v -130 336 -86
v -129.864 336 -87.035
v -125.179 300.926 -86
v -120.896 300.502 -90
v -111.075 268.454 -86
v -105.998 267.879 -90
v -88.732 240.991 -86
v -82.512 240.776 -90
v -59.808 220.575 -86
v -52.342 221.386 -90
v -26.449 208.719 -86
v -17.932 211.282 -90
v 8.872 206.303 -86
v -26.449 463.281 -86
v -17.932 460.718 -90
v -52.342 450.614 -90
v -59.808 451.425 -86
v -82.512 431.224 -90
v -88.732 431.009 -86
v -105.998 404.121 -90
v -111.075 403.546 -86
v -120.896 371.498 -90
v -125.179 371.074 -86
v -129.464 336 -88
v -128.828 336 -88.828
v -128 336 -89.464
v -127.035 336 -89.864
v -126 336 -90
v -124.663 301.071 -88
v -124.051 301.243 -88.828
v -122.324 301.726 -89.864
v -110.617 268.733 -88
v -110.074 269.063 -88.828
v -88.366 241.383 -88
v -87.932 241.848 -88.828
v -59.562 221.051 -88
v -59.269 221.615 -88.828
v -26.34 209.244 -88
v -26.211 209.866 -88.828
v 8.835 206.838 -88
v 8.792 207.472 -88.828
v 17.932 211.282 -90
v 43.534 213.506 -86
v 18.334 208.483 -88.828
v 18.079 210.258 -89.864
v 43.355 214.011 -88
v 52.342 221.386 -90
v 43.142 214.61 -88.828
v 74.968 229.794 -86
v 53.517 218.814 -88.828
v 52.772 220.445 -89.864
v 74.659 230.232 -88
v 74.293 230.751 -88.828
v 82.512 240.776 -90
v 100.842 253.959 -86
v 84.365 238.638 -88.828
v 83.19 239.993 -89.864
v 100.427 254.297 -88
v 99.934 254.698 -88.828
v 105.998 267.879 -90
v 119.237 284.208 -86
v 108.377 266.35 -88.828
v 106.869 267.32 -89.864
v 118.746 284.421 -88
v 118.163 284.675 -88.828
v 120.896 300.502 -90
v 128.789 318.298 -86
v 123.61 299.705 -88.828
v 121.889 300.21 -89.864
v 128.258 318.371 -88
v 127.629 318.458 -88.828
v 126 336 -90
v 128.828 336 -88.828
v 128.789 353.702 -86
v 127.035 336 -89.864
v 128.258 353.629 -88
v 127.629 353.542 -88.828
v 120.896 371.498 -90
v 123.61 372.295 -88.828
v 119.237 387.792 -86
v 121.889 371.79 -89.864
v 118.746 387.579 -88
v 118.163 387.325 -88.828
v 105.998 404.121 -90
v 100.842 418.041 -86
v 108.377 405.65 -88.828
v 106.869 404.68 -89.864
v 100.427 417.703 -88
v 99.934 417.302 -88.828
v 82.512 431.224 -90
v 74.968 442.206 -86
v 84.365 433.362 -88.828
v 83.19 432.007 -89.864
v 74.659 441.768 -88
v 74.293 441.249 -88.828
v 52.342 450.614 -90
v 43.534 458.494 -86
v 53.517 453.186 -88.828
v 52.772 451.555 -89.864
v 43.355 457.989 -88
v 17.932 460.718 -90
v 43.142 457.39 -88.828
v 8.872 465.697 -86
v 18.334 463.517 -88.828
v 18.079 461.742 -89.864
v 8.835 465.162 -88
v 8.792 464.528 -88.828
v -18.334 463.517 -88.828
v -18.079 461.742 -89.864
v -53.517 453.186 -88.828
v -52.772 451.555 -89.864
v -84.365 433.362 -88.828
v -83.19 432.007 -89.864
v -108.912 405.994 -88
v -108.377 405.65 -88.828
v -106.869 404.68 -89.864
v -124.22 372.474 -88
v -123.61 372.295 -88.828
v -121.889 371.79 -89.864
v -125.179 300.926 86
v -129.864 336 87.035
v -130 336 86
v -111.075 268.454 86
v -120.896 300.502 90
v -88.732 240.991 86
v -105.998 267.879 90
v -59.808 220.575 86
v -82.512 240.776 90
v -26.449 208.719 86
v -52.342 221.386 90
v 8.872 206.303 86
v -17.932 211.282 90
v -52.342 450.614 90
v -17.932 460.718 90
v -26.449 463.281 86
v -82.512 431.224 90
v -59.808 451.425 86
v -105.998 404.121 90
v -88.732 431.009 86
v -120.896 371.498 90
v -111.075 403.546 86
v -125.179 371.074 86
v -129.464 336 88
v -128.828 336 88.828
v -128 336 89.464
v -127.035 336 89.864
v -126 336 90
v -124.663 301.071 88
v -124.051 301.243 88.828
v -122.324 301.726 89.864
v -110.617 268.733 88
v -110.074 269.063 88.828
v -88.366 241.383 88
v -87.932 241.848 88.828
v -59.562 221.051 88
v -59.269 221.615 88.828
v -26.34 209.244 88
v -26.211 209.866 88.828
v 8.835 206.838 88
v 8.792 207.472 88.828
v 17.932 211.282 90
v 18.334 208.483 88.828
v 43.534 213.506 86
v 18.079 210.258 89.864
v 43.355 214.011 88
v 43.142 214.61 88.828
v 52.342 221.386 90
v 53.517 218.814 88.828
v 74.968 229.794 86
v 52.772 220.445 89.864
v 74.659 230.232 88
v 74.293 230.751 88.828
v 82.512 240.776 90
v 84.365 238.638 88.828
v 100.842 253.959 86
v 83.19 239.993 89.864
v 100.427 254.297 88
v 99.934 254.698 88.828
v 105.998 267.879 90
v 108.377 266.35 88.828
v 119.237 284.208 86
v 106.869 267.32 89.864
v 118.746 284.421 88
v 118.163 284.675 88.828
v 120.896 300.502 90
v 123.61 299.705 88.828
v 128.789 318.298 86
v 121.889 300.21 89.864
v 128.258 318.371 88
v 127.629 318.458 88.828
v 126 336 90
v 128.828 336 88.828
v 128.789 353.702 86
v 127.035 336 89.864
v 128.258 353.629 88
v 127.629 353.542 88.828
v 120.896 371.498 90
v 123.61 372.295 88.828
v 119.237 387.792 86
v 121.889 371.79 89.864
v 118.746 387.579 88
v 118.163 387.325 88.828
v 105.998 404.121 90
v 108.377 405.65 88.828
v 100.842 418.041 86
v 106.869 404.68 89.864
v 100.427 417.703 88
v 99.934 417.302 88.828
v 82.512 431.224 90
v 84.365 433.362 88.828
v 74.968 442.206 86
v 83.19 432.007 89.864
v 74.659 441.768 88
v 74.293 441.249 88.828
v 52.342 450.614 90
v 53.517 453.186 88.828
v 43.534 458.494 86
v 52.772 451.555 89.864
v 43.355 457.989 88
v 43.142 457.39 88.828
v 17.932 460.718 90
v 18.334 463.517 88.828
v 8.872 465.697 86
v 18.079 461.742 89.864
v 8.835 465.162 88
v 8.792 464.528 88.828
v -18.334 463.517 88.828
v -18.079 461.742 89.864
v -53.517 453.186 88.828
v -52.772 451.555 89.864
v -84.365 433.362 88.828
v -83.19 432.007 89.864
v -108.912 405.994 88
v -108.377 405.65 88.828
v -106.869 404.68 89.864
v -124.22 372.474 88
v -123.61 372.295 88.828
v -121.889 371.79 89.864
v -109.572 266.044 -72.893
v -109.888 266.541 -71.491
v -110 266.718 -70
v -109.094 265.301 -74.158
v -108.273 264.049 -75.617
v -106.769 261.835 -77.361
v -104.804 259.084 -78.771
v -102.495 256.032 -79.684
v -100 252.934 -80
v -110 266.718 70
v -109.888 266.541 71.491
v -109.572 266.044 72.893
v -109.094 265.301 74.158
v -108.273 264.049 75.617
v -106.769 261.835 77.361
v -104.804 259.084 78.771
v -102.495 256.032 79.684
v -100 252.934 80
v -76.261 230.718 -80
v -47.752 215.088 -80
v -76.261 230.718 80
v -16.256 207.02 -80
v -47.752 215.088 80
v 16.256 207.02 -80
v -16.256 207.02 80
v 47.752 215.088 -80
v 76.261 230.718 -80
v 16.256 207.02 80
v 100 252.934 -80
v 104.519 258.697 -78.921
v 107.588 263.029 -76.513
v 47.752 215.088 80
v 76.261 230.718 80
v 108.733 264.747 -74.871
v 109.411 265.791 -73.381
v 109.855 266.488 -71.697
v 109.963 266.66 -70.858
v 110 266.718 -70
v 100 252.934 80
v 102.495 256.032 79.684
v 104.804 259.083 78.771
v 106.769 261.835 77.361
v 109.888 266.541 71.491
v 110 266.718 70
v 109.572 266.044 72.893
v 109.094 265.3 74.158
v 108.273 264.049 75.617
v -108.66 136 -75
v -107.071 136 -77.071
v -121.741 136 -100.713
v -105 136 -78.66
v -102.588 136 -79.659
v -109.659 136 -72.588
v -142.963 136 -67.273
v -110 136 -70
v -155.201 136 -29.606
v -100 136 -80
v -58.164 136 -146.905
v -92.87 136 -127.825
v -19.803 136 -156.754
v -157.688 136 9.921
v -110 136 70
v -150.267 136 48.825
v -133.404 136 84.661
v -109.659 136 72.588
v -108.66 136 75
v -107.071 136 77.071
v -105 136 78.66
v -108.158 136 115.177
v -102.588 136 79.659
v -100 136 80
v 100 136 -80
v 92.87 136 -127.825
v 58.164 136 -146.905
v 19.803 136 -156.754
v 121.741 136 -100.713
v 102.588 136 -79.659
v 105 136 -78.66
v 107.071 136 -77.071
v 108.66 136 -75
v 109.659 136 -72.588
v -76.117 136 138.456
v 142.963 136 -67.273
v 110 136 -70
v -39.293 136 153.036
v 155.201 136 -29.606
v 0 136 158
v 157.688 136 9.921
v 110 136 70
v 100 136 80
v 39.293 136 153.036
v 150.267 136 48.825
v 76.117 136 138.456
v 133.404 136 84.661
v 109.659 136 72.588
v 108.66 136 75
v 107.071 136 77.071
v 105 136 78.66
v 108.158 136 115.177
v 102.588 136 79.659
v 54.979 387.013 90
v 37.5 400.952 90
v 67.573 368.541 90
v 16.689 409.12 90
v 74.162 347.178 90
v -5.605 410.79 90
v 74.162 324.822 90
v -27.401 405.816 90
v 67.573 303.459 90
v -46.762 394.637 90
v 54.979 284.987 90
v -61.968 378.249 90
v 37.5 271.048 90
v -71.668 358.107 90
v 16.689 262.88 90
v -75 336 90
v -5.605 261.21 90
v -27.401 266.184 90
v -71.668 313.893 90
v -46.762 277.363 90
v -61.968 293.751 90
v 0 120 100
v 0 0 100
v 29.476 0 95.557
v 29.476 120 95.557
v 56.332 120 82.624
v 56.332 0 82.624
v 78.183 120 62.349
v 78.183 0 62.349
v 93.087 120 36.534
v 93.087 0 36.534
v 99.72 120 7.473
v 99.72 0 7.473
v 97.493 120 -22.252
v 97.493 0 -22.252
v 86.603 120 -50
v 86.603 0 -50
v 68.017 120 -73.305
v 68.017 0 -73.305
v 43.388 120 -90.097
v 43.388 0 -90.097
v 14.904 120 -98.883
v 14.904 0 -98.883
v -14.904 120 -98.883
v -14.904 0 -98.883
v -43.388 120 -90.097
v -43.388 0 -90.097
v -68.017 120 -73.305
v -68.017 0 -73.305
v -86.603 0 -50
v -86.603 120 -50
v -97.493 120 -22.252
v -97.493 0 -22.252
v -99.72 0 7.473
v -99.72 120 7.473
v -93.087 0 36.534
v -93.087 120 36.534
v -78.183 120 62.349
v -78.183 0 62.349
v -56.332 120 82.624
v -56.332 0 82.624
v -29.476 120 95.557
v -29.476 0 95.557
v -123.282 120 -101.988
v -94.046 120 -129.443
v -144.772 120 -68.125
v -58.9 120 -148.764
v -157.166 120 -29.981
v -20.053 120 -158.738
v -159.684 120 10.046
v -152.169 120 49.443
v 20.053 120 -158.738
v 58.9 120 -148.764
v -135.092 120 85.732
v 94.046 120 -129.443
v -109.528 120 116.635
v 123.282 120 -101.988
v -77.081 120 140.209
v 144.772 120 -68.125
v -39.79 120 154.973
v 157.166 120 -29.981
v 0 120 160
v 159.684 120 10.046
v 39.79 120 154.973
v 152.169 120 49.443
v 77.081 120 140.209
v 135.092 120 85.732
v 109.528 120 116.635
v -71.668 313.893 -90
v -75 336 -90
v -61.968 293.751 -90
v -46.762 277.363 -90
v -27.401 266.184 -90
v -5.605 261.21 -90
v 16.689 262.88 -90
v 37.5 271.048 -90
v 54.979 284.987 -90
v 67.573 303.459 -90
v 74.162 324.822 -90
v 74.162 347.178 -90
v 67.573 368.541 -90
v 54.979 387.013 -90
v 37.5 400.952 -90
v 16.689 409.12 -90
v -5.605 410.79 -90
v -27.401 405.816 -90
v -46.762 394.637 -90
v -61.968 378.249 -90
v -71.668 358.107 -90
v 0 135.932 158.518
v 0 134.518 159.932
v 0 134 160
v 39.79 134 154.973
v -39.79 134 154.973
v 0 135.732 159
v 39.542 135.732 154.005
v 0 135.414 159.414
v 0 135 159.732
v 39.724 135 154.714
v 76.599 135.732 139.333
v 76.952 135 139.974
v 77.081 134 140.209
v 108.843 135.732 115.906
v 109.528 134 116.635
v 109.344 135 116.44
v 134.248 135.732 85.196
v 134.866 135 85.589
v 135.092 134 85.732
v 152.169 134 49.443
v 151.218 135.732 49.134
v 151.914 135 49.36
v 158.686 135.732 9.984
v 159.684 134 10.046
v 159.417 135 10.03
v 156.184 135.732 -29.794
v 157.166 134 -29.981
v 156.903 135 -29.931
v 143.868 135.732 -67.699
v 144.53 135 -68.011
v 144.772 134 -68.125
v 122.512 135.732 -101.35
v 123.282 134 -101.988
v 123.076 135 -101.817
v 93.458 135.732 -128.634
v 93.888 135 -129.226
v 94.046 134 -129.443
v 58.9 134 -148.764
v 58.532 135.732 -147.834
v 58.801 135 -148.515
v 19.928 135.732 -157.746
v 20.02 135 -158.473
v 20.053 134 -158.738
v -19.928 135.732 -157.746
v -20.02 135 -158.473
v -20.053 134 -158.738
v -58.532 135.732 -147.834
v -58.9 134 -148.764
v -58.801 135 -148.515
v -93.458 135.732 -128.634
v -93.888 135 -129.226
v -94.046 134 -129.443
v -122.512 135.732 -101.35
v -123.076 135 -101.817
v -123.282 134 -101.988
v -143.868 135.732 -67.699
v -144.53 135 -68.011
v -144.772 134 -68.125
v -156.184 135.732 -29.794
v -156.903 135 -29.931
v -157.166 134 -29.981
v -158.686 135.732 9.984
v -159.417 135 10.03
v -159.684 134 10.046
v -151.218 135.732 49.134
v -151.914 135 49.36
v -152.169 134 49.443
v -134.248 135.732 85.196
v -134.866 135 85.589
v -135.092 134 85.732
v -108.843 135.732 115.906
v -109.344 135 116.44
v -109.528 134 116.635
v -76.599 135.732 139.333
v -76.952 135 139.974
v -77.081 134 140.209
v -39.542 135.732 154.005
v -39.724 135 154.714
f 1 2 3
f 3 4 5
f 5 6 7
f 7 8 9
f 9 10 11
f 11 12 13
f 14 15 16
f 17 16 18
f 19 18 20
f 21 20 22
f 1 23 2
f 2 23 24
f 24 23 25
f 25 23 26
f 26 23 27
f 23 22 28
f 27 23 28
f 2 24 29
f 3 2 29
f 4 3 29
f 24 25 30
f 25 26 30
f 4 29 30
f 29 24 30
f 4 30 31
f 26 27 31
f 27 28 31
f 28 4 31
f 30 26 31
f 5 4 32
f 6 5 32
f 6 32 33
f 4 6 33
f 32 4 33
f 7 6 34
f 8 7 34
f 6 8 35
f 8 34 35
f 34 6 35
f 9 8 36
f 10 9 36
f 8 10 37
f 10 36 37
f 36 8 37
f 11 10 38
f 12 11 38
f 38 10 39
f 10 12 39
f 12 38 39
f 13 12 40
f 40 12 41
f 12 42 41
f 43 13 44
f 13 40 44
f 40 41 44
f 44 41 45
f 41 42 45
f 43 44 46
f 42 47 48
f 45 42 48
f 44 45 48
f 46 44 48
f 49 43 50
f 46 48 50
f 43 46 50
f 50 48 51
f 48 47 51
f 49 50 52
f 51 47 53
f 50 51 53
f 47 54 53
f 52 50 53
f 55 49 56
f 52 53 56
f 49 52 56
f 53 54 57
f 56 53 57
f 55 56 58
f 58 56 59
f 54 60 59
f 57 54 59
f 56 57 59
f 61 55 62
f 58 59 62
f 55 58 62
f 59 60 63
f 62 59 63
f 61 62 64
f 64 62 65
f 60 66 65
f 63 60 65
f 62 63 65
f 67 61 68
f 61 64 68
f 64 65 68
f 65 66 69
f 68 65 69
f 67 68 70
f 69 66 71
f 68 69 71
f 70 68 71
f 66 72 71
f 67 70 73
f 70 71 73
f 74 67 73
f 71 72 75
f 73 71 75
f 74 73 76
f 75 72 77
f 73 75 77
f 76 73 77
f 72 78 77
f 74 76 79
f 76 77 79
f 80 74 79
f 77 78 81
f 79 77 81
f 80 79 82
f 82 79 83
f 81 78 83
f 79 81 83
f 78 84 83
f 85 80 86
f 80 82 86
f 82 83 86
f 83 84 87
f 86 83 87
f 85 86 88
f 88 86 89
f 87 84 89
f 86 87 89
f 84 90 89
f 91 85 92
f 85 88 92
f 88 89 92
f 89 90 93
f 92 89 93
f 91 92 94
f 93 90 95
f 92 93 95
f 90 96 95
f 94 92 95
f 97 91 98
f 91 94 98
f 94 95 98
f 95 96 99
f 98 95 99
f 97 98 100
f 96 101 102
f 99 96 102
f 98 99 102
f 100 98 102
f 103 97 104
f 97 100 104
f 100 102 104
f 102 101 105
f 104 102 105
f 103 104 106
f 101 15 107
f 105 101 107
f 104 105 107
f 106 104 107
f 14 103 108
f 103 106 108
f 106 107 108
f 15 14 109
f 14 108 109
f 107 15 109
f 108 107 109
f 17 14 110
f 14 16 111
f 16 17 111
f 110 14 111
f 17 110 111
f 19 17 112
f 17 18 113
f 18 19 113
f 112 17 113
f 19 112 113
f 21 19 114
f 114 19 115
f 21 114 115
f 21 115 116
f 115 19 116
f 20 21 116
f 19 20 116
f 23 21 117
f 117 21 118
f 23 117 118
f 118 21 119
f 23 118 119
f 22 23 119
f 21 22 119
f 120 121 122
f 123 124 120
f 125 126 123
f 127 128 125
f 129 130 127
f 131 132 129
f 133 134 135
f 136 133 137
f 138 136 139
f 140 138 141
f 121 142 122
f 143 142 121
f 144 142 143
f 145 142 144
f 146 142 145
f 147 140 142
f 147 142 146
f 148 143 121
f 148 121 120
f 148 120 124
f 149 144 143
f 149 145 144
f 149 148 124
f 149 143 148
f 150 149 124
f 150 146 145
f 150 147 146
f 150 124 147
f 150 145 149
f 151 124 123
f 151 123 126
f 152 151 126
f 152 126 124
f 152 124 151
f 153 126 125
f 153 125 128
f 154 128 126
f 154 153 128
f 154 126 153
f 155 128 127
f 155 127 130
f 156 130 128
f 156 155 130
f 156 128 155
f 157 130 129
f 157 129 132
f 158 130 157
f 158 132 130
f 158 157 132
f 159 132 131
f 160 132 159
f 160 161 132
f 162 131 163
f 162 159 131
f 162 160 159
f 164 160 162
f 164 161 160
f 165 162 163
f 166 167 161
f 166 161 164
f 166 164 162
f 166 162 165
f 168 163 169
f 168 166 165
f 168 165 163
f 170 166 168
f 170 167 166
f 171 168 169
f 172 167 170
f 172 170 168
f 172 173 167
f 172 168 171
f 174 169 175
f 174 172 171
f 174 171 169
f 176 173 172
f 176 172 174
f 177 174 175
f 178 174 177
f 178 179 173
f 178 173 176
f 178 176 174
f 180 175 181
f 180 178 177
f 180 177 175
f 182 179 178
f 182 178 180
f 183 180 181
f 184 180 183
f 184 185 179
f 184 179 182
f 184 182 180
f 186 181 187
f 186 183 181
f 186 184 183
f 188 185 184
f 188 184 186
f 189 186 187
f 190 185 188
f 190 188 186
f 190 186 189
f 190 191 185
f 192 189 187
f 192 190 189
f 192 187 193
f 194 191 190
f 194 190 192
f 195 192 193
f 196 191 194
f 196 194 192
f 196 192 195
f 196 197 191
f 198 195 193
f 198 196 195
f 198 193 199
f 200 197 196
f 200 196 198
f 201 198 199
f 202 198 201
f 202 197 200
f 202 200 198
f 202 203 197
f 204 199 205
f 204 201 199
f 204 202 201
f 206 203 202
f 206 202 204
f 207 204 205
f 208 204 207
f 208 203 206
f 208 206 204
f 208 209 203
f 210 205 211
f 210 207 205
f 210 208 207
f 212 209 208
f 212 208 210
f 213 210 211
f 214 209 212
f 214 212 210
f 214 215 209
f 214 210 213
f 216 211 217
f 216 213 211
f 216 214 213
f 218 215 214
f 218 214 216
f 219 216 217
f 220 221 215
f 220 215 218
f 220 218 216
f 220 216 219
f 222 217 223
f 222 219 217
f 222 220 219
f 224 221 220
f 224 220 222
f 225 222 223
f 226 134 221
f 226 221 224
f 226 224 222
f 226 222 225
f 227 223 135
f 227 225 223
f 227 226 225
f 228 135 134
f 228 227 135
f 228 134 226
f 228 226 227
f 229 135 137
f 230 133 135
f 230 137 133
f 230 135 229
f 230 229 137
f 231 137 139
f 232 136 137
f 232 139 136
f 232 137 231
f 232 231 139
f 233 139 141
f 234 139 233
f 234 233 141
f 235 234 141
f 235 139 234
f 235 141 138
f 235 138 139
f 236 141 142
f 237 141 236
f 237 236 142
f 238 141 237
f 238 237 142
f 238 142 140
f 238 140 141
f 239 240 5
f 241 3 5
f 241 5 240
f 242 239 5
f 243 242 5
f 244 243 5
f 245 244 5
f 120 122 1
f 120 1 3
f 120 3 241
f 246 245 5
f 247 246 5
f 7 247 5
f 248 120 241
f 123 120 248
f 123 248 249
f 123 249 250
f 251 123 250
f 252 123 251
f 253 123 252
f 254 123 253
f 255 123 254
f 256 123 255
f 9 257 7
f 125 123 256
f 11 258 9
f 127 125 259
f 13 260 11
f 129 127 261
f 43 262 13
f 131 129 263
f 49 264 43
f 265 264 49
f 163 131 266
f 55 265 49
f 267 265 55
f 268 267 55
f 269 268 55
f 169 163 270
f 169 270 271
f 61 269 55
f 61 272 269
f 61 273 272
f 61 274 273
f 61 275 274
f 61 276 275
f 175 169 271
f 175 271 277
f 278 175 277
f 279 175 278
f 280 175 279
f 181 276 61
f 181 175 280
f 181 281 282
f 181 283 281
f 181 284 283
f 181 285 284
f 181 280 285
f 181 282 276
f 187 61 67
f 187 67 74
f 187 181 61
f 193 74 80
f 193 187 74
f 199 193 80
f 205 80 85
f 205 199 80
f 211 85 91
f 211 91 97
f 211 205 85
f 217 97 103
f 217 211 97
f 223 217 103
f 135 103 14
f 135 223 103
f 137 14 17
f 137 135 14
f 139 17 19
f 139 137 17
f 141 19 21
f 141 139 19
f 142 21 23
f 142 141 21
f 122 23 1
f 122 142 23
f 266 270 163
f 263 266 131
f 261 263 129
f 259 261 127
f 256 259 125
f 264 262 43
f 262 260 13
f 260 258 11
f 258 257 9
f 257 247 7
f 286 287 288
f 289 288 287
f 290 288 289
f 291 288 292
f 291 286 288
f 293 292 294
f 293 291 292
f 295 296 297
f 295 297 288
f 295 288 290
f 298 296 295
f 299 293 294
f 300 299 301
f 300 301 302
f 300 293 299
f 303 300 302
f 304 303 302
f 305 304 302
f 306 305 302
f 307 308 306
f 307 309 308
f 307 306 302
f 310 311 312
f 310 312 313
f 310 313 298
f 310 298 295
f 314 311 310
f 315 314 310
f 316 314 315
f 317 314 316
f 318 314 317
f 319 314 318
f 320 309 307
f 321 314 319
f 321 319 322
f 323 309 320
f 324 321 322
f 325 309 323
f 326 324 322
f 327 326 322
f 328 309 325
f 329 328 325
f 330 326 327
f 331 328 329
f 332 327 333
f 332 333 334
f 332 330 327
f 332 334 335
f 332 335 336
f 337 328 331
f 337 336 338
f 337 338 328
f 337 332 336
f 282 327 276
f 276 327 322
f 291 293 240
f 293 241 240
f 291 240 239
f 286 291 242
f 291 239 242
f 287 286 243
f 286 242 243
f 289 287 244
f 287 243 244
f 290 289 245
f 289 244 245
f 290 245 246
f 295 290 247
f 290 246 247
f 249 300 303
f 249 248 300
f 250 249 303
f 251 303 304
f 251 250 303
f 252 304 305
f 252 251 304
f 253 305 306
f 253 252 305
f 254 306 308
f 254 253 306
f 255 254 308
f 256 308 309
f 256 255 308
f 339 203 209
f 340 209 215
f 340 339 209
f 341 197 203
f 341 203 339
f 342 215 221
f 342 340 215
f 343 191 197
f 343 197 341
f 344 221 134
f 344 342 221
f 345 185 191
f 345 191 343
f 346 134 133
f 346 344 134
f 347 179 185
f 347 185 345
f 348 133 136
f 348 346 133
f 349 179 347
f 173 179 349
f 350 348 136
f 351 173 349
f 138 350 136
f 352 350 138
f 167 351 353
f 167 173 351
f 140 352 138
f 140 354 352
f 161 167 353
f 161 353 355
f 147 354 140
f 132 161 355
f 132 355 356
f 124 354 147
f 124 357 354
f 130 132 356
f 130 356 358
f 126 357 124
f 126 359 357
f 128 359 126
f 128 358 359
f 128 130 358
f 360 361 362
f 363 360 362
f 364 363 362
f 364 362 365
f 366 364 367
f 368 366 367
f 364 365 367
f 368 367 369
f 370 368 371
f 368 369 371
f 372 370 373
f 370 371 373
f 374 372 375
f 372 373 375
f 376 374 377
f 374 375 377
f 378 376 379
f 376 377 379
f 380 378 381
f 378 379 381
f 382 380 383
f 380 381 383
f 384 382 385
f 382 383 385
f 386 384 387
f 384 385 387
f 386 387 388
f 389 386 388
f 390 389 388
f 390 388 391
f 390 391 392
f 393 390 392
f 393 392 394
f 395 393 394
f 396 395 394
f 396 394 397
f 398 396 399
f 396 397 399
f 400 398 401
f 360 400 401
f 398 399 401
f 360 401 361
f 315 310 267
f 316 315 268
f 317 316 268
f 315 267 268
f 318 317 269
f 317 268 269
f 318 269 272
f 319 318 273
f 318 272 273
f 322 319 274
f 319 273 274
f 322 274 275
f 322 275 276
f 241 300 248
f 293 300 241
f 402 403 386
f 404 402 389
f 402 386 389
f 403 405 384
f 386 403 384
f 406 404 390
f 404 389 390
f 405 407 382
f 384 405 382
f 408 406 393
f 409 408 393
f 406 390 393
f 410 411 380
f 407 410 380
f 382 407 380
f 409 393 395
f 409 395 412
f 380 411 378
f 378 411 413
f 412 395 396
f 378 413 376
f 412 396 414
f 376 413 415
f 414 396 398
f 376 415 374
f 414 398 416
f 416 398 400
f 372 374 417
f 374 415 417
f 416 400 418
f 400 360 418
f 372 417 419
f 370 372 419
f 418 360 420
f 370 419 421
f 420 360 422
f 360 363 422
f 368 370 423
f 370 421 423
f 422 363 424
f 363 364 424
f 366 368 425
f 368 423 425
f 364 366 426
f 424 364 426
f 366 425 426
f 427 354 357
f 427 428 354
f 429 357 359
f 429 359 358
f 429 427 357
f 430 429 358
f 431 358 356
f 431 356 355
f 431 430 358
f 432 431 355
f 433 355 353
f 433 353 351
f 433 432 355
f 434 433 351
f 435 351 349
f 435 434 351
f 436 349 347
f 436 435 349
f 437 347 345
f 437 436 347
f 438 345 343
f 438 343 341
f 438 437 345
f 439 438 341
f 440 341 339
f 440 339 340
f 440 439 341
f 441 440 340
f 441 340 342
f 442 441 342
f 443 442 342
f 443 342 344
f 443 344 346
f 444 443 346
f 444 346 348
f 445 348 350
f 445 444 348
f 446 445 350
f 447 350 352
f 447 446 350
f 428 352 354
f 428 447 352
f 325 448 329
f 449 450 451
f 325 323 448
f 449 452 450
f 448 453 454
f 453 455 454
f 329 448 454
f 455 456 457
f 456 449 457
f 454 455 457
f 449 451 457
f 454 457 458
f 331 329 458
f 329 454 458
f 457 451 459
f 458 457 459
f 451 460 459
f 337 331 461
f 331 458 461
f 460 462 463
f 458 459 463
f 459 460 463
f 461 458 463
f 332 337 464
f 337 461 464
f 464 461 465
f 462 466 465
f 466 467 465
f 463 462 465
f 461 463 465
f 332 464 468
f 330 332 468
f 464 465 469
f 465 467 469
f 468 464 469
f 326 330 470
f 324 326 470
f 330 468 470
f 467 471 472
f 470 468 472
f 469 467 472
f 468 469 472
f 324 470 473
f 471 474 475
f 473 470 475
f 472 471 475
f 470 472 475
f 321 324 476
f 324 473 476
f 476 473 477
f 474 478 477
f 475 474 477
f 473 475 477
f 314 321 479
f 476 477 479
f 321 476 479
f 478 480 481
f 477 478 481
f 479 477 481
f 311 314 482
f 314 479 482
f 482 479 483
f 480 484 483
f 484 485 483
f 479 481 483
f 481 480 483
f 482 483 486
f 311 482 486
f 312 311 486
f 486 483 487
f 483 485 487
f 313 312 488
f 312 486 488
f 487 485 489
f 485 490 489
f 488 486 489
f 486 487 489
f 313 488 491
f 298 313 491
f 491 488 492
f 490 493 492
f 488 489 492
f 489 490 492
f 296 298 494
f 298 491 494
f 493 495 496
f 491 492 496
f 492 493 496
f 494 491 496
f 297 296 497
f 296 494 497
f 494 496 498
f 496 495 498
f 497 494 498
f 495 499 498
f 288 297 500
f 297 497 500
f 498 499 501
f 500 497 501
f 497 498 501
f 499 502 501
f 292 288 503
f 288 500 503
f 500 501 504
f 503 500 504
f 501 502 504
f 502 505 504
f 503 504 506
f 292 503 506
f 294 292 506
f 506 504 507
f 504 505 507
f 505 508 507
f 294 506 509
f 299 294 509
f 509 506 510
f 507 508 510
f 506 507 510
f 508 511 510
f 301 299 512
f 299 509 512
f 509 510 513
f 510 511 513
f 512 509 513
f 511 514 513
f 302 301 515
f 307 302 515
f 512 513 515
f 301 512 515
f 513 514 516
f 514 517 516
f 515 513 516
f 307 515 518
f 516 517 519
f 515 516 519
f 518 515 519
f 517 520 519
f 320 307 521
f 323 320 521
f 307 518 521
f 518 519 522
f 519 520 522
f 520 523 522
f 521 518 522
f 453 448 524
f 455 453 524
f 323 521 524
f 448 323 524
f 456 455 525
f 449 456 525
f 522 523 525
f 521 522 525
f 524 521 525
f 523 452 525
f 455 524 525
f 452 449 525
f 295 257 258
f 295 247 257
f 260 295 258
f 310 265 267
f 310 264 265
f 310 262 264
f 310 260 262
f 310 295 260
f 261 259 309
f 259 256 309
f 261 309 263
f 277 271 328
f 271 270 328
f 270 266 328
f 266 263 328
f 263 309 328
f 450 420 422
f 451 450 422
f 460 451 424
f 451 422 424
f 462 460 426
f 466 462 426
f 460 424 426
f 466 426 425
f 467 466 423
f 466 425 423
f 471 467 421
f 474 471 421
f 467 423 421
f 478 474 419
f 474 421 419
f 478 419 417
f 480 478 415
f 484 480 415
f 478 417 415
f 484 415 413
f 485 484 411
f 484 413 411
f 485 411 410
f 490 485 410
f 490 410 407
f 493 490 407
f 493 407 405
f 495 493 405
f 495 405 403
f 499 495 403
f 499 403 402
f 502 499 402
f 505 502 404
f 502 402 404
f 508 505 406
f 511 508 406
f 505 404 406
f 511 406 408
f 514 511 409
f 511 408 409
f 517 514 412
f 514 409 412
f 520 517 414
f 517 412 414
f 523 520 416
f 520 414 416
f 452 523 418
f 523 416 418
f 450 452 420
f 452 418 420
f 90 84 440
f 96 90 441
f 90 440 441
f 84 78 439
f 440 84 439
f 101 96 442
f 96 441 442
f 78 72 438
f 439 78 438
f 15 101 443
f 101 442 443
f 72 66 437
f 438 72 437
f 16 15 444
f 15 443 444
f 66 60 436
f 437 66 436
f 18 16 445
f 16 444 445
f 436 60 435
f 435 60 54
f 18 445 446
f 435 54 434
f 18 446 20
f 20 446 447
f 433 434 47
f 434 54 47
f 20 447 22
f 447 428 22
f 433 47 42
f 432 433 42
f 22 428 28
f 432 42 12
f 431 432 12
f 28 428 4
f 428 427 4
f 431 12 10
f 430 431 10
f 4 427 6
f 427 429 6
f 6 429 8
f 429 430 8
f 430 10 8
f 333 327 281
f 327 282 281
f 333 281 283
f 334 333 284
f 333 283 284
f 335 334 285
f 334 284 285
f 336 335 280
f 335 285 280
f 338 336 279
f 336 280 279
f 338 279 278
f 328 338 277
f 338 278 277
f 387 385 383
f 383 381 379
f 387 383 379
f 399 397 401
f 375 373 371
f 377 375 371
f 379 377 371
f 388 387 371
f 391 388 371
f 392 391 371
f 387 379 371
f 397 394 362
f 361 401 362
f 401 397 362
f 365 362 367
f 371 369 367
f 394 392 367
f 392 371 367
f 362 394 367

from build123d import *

# Parameters (mm, degrees)
SKETCH1_R                = 100
BOSS_EXTRUDE1_DEPTH      = 120
SKETCH2_R                = 160
BOSS_EXTRUDE2_DEPTH      = 16
SKETCH3_R                = 130
SKETCH3_R_2              = 75
BOSS_EXTRUDE3_DEPTH      = 90
BOSS_EXTRUDE4_REACH      = 402.125
BOSS_EXTRUDE4_END_RADIUS = 130
SKETCH4_W                = 220
SKETCH4_H                = 160
FILLET1_R                = 2
FILLET2_R                = 4
FILLET3_R                = 10


with BuildPart() as part:
    # Sketch1 → Boss-Extrude1 (new body)
    with BuildSketch(Plane(origin=(0, 0, 0), x_dir=(1, 0, 0), z_dir=(0, 1, 0))):
        with Locations(Location((0, 0, 0), (0, 0, 270))):
            Circle(SKETCH1_R)
    extrude(amount=BOSS_EXTRUDE1_DEPTH)

    # Sketch2 → Boss-Extrude2 (add)
    with BuildSketch(Plane(origin=(0, 120, 0), x_dir=(1, 0, 0), z_dir=(0, 1, 0))):
        with Locations(Location((0, 0, 0), (0, 0, 270))):
            Circle(SKETCH2_R)
    extrude(amount=BOSS_EXTRUDE2_DEPTH)



with BuildPart() as body_2:
    # Sketch3 → Boss-Extrude3 (new, symmetric)
    with BuildSketch(Plane.XY):
        with Locations(Location((0, 336, 0), (0, 0, 180))):
            Circle(SKETCH3_R)
        with Locations(Location((0, 336, 0), (0, 0, 180))):
            Circle(SKETCH3_R_2, mode=Mode.SUBTRACT)
    extrude(amount=BOSS_EXTRUDE3_DEPTH, both=True)


with BuildPart() as part_1:
    add(part.part)

    add(body_2.part)  # Boss-Extrude4 merges body 2
    # Boss-Extrude4: up to this cylinder (the profile starts outside it)
    boss_extrude4_end = Plane(origin=(0, 336, 0), z_dir=(0, 0, -1)) * Cylinder(BOSS_EXTRUDE4_END_RADIUS, 1065.25, mode=Mode.PRIVATE)
    # Sketch4 → Boss-Extrude4 (add, up to the surface)
    with BuildSketch(Plane(origin=(0, 136, 0), x_dir=(1, 0, 0), z_dir=(0, 1, 0)), mode=Mode.PRIVATE) as boss_extrude4_sk1:
        Rectangle(SKETCH4_W, SKETCH4_H)
    boss_extrude4_tool1 = extrude(boss_extrude4_sk1.sketch, amount=BOSS_EXTRUDE4_REACH, mode=Mode.PRIVATE) - boss_extrude4_end
    add(boss_extrude4_tool1.solids().sort_by_distance((0, 136, 0))[0])

    # Fillet1
    fillet1_edges = [part_1.edges().sort_by_distance(p)[0] for p in [
        (0, 136, -160),
    ]]
    fillet(fillet1_edges, radius=FILLET1_R)

    # Fillet2
    fillet2_edges = [part_1.edges().sort_by_distance(p)[0] for p in [
        (130, 336, -90),
        (130, 336, 90),
    ]]
    fillet(fillet2_edges, radius=FILLET2_R)

    # Fillet3
    fillet3_edges = [part_1.edges().sort_by_distance(p)[0] for p in [
        (-110, 201.358983849, 80),
        (-110, 201.358983849, -80),
        (110, 201.358983849, 80),
        (110, 201.358983849, -80),
    ]]
    fillet(fillet3_edges, radius=FILLET3_R)


solid = part_1.part
